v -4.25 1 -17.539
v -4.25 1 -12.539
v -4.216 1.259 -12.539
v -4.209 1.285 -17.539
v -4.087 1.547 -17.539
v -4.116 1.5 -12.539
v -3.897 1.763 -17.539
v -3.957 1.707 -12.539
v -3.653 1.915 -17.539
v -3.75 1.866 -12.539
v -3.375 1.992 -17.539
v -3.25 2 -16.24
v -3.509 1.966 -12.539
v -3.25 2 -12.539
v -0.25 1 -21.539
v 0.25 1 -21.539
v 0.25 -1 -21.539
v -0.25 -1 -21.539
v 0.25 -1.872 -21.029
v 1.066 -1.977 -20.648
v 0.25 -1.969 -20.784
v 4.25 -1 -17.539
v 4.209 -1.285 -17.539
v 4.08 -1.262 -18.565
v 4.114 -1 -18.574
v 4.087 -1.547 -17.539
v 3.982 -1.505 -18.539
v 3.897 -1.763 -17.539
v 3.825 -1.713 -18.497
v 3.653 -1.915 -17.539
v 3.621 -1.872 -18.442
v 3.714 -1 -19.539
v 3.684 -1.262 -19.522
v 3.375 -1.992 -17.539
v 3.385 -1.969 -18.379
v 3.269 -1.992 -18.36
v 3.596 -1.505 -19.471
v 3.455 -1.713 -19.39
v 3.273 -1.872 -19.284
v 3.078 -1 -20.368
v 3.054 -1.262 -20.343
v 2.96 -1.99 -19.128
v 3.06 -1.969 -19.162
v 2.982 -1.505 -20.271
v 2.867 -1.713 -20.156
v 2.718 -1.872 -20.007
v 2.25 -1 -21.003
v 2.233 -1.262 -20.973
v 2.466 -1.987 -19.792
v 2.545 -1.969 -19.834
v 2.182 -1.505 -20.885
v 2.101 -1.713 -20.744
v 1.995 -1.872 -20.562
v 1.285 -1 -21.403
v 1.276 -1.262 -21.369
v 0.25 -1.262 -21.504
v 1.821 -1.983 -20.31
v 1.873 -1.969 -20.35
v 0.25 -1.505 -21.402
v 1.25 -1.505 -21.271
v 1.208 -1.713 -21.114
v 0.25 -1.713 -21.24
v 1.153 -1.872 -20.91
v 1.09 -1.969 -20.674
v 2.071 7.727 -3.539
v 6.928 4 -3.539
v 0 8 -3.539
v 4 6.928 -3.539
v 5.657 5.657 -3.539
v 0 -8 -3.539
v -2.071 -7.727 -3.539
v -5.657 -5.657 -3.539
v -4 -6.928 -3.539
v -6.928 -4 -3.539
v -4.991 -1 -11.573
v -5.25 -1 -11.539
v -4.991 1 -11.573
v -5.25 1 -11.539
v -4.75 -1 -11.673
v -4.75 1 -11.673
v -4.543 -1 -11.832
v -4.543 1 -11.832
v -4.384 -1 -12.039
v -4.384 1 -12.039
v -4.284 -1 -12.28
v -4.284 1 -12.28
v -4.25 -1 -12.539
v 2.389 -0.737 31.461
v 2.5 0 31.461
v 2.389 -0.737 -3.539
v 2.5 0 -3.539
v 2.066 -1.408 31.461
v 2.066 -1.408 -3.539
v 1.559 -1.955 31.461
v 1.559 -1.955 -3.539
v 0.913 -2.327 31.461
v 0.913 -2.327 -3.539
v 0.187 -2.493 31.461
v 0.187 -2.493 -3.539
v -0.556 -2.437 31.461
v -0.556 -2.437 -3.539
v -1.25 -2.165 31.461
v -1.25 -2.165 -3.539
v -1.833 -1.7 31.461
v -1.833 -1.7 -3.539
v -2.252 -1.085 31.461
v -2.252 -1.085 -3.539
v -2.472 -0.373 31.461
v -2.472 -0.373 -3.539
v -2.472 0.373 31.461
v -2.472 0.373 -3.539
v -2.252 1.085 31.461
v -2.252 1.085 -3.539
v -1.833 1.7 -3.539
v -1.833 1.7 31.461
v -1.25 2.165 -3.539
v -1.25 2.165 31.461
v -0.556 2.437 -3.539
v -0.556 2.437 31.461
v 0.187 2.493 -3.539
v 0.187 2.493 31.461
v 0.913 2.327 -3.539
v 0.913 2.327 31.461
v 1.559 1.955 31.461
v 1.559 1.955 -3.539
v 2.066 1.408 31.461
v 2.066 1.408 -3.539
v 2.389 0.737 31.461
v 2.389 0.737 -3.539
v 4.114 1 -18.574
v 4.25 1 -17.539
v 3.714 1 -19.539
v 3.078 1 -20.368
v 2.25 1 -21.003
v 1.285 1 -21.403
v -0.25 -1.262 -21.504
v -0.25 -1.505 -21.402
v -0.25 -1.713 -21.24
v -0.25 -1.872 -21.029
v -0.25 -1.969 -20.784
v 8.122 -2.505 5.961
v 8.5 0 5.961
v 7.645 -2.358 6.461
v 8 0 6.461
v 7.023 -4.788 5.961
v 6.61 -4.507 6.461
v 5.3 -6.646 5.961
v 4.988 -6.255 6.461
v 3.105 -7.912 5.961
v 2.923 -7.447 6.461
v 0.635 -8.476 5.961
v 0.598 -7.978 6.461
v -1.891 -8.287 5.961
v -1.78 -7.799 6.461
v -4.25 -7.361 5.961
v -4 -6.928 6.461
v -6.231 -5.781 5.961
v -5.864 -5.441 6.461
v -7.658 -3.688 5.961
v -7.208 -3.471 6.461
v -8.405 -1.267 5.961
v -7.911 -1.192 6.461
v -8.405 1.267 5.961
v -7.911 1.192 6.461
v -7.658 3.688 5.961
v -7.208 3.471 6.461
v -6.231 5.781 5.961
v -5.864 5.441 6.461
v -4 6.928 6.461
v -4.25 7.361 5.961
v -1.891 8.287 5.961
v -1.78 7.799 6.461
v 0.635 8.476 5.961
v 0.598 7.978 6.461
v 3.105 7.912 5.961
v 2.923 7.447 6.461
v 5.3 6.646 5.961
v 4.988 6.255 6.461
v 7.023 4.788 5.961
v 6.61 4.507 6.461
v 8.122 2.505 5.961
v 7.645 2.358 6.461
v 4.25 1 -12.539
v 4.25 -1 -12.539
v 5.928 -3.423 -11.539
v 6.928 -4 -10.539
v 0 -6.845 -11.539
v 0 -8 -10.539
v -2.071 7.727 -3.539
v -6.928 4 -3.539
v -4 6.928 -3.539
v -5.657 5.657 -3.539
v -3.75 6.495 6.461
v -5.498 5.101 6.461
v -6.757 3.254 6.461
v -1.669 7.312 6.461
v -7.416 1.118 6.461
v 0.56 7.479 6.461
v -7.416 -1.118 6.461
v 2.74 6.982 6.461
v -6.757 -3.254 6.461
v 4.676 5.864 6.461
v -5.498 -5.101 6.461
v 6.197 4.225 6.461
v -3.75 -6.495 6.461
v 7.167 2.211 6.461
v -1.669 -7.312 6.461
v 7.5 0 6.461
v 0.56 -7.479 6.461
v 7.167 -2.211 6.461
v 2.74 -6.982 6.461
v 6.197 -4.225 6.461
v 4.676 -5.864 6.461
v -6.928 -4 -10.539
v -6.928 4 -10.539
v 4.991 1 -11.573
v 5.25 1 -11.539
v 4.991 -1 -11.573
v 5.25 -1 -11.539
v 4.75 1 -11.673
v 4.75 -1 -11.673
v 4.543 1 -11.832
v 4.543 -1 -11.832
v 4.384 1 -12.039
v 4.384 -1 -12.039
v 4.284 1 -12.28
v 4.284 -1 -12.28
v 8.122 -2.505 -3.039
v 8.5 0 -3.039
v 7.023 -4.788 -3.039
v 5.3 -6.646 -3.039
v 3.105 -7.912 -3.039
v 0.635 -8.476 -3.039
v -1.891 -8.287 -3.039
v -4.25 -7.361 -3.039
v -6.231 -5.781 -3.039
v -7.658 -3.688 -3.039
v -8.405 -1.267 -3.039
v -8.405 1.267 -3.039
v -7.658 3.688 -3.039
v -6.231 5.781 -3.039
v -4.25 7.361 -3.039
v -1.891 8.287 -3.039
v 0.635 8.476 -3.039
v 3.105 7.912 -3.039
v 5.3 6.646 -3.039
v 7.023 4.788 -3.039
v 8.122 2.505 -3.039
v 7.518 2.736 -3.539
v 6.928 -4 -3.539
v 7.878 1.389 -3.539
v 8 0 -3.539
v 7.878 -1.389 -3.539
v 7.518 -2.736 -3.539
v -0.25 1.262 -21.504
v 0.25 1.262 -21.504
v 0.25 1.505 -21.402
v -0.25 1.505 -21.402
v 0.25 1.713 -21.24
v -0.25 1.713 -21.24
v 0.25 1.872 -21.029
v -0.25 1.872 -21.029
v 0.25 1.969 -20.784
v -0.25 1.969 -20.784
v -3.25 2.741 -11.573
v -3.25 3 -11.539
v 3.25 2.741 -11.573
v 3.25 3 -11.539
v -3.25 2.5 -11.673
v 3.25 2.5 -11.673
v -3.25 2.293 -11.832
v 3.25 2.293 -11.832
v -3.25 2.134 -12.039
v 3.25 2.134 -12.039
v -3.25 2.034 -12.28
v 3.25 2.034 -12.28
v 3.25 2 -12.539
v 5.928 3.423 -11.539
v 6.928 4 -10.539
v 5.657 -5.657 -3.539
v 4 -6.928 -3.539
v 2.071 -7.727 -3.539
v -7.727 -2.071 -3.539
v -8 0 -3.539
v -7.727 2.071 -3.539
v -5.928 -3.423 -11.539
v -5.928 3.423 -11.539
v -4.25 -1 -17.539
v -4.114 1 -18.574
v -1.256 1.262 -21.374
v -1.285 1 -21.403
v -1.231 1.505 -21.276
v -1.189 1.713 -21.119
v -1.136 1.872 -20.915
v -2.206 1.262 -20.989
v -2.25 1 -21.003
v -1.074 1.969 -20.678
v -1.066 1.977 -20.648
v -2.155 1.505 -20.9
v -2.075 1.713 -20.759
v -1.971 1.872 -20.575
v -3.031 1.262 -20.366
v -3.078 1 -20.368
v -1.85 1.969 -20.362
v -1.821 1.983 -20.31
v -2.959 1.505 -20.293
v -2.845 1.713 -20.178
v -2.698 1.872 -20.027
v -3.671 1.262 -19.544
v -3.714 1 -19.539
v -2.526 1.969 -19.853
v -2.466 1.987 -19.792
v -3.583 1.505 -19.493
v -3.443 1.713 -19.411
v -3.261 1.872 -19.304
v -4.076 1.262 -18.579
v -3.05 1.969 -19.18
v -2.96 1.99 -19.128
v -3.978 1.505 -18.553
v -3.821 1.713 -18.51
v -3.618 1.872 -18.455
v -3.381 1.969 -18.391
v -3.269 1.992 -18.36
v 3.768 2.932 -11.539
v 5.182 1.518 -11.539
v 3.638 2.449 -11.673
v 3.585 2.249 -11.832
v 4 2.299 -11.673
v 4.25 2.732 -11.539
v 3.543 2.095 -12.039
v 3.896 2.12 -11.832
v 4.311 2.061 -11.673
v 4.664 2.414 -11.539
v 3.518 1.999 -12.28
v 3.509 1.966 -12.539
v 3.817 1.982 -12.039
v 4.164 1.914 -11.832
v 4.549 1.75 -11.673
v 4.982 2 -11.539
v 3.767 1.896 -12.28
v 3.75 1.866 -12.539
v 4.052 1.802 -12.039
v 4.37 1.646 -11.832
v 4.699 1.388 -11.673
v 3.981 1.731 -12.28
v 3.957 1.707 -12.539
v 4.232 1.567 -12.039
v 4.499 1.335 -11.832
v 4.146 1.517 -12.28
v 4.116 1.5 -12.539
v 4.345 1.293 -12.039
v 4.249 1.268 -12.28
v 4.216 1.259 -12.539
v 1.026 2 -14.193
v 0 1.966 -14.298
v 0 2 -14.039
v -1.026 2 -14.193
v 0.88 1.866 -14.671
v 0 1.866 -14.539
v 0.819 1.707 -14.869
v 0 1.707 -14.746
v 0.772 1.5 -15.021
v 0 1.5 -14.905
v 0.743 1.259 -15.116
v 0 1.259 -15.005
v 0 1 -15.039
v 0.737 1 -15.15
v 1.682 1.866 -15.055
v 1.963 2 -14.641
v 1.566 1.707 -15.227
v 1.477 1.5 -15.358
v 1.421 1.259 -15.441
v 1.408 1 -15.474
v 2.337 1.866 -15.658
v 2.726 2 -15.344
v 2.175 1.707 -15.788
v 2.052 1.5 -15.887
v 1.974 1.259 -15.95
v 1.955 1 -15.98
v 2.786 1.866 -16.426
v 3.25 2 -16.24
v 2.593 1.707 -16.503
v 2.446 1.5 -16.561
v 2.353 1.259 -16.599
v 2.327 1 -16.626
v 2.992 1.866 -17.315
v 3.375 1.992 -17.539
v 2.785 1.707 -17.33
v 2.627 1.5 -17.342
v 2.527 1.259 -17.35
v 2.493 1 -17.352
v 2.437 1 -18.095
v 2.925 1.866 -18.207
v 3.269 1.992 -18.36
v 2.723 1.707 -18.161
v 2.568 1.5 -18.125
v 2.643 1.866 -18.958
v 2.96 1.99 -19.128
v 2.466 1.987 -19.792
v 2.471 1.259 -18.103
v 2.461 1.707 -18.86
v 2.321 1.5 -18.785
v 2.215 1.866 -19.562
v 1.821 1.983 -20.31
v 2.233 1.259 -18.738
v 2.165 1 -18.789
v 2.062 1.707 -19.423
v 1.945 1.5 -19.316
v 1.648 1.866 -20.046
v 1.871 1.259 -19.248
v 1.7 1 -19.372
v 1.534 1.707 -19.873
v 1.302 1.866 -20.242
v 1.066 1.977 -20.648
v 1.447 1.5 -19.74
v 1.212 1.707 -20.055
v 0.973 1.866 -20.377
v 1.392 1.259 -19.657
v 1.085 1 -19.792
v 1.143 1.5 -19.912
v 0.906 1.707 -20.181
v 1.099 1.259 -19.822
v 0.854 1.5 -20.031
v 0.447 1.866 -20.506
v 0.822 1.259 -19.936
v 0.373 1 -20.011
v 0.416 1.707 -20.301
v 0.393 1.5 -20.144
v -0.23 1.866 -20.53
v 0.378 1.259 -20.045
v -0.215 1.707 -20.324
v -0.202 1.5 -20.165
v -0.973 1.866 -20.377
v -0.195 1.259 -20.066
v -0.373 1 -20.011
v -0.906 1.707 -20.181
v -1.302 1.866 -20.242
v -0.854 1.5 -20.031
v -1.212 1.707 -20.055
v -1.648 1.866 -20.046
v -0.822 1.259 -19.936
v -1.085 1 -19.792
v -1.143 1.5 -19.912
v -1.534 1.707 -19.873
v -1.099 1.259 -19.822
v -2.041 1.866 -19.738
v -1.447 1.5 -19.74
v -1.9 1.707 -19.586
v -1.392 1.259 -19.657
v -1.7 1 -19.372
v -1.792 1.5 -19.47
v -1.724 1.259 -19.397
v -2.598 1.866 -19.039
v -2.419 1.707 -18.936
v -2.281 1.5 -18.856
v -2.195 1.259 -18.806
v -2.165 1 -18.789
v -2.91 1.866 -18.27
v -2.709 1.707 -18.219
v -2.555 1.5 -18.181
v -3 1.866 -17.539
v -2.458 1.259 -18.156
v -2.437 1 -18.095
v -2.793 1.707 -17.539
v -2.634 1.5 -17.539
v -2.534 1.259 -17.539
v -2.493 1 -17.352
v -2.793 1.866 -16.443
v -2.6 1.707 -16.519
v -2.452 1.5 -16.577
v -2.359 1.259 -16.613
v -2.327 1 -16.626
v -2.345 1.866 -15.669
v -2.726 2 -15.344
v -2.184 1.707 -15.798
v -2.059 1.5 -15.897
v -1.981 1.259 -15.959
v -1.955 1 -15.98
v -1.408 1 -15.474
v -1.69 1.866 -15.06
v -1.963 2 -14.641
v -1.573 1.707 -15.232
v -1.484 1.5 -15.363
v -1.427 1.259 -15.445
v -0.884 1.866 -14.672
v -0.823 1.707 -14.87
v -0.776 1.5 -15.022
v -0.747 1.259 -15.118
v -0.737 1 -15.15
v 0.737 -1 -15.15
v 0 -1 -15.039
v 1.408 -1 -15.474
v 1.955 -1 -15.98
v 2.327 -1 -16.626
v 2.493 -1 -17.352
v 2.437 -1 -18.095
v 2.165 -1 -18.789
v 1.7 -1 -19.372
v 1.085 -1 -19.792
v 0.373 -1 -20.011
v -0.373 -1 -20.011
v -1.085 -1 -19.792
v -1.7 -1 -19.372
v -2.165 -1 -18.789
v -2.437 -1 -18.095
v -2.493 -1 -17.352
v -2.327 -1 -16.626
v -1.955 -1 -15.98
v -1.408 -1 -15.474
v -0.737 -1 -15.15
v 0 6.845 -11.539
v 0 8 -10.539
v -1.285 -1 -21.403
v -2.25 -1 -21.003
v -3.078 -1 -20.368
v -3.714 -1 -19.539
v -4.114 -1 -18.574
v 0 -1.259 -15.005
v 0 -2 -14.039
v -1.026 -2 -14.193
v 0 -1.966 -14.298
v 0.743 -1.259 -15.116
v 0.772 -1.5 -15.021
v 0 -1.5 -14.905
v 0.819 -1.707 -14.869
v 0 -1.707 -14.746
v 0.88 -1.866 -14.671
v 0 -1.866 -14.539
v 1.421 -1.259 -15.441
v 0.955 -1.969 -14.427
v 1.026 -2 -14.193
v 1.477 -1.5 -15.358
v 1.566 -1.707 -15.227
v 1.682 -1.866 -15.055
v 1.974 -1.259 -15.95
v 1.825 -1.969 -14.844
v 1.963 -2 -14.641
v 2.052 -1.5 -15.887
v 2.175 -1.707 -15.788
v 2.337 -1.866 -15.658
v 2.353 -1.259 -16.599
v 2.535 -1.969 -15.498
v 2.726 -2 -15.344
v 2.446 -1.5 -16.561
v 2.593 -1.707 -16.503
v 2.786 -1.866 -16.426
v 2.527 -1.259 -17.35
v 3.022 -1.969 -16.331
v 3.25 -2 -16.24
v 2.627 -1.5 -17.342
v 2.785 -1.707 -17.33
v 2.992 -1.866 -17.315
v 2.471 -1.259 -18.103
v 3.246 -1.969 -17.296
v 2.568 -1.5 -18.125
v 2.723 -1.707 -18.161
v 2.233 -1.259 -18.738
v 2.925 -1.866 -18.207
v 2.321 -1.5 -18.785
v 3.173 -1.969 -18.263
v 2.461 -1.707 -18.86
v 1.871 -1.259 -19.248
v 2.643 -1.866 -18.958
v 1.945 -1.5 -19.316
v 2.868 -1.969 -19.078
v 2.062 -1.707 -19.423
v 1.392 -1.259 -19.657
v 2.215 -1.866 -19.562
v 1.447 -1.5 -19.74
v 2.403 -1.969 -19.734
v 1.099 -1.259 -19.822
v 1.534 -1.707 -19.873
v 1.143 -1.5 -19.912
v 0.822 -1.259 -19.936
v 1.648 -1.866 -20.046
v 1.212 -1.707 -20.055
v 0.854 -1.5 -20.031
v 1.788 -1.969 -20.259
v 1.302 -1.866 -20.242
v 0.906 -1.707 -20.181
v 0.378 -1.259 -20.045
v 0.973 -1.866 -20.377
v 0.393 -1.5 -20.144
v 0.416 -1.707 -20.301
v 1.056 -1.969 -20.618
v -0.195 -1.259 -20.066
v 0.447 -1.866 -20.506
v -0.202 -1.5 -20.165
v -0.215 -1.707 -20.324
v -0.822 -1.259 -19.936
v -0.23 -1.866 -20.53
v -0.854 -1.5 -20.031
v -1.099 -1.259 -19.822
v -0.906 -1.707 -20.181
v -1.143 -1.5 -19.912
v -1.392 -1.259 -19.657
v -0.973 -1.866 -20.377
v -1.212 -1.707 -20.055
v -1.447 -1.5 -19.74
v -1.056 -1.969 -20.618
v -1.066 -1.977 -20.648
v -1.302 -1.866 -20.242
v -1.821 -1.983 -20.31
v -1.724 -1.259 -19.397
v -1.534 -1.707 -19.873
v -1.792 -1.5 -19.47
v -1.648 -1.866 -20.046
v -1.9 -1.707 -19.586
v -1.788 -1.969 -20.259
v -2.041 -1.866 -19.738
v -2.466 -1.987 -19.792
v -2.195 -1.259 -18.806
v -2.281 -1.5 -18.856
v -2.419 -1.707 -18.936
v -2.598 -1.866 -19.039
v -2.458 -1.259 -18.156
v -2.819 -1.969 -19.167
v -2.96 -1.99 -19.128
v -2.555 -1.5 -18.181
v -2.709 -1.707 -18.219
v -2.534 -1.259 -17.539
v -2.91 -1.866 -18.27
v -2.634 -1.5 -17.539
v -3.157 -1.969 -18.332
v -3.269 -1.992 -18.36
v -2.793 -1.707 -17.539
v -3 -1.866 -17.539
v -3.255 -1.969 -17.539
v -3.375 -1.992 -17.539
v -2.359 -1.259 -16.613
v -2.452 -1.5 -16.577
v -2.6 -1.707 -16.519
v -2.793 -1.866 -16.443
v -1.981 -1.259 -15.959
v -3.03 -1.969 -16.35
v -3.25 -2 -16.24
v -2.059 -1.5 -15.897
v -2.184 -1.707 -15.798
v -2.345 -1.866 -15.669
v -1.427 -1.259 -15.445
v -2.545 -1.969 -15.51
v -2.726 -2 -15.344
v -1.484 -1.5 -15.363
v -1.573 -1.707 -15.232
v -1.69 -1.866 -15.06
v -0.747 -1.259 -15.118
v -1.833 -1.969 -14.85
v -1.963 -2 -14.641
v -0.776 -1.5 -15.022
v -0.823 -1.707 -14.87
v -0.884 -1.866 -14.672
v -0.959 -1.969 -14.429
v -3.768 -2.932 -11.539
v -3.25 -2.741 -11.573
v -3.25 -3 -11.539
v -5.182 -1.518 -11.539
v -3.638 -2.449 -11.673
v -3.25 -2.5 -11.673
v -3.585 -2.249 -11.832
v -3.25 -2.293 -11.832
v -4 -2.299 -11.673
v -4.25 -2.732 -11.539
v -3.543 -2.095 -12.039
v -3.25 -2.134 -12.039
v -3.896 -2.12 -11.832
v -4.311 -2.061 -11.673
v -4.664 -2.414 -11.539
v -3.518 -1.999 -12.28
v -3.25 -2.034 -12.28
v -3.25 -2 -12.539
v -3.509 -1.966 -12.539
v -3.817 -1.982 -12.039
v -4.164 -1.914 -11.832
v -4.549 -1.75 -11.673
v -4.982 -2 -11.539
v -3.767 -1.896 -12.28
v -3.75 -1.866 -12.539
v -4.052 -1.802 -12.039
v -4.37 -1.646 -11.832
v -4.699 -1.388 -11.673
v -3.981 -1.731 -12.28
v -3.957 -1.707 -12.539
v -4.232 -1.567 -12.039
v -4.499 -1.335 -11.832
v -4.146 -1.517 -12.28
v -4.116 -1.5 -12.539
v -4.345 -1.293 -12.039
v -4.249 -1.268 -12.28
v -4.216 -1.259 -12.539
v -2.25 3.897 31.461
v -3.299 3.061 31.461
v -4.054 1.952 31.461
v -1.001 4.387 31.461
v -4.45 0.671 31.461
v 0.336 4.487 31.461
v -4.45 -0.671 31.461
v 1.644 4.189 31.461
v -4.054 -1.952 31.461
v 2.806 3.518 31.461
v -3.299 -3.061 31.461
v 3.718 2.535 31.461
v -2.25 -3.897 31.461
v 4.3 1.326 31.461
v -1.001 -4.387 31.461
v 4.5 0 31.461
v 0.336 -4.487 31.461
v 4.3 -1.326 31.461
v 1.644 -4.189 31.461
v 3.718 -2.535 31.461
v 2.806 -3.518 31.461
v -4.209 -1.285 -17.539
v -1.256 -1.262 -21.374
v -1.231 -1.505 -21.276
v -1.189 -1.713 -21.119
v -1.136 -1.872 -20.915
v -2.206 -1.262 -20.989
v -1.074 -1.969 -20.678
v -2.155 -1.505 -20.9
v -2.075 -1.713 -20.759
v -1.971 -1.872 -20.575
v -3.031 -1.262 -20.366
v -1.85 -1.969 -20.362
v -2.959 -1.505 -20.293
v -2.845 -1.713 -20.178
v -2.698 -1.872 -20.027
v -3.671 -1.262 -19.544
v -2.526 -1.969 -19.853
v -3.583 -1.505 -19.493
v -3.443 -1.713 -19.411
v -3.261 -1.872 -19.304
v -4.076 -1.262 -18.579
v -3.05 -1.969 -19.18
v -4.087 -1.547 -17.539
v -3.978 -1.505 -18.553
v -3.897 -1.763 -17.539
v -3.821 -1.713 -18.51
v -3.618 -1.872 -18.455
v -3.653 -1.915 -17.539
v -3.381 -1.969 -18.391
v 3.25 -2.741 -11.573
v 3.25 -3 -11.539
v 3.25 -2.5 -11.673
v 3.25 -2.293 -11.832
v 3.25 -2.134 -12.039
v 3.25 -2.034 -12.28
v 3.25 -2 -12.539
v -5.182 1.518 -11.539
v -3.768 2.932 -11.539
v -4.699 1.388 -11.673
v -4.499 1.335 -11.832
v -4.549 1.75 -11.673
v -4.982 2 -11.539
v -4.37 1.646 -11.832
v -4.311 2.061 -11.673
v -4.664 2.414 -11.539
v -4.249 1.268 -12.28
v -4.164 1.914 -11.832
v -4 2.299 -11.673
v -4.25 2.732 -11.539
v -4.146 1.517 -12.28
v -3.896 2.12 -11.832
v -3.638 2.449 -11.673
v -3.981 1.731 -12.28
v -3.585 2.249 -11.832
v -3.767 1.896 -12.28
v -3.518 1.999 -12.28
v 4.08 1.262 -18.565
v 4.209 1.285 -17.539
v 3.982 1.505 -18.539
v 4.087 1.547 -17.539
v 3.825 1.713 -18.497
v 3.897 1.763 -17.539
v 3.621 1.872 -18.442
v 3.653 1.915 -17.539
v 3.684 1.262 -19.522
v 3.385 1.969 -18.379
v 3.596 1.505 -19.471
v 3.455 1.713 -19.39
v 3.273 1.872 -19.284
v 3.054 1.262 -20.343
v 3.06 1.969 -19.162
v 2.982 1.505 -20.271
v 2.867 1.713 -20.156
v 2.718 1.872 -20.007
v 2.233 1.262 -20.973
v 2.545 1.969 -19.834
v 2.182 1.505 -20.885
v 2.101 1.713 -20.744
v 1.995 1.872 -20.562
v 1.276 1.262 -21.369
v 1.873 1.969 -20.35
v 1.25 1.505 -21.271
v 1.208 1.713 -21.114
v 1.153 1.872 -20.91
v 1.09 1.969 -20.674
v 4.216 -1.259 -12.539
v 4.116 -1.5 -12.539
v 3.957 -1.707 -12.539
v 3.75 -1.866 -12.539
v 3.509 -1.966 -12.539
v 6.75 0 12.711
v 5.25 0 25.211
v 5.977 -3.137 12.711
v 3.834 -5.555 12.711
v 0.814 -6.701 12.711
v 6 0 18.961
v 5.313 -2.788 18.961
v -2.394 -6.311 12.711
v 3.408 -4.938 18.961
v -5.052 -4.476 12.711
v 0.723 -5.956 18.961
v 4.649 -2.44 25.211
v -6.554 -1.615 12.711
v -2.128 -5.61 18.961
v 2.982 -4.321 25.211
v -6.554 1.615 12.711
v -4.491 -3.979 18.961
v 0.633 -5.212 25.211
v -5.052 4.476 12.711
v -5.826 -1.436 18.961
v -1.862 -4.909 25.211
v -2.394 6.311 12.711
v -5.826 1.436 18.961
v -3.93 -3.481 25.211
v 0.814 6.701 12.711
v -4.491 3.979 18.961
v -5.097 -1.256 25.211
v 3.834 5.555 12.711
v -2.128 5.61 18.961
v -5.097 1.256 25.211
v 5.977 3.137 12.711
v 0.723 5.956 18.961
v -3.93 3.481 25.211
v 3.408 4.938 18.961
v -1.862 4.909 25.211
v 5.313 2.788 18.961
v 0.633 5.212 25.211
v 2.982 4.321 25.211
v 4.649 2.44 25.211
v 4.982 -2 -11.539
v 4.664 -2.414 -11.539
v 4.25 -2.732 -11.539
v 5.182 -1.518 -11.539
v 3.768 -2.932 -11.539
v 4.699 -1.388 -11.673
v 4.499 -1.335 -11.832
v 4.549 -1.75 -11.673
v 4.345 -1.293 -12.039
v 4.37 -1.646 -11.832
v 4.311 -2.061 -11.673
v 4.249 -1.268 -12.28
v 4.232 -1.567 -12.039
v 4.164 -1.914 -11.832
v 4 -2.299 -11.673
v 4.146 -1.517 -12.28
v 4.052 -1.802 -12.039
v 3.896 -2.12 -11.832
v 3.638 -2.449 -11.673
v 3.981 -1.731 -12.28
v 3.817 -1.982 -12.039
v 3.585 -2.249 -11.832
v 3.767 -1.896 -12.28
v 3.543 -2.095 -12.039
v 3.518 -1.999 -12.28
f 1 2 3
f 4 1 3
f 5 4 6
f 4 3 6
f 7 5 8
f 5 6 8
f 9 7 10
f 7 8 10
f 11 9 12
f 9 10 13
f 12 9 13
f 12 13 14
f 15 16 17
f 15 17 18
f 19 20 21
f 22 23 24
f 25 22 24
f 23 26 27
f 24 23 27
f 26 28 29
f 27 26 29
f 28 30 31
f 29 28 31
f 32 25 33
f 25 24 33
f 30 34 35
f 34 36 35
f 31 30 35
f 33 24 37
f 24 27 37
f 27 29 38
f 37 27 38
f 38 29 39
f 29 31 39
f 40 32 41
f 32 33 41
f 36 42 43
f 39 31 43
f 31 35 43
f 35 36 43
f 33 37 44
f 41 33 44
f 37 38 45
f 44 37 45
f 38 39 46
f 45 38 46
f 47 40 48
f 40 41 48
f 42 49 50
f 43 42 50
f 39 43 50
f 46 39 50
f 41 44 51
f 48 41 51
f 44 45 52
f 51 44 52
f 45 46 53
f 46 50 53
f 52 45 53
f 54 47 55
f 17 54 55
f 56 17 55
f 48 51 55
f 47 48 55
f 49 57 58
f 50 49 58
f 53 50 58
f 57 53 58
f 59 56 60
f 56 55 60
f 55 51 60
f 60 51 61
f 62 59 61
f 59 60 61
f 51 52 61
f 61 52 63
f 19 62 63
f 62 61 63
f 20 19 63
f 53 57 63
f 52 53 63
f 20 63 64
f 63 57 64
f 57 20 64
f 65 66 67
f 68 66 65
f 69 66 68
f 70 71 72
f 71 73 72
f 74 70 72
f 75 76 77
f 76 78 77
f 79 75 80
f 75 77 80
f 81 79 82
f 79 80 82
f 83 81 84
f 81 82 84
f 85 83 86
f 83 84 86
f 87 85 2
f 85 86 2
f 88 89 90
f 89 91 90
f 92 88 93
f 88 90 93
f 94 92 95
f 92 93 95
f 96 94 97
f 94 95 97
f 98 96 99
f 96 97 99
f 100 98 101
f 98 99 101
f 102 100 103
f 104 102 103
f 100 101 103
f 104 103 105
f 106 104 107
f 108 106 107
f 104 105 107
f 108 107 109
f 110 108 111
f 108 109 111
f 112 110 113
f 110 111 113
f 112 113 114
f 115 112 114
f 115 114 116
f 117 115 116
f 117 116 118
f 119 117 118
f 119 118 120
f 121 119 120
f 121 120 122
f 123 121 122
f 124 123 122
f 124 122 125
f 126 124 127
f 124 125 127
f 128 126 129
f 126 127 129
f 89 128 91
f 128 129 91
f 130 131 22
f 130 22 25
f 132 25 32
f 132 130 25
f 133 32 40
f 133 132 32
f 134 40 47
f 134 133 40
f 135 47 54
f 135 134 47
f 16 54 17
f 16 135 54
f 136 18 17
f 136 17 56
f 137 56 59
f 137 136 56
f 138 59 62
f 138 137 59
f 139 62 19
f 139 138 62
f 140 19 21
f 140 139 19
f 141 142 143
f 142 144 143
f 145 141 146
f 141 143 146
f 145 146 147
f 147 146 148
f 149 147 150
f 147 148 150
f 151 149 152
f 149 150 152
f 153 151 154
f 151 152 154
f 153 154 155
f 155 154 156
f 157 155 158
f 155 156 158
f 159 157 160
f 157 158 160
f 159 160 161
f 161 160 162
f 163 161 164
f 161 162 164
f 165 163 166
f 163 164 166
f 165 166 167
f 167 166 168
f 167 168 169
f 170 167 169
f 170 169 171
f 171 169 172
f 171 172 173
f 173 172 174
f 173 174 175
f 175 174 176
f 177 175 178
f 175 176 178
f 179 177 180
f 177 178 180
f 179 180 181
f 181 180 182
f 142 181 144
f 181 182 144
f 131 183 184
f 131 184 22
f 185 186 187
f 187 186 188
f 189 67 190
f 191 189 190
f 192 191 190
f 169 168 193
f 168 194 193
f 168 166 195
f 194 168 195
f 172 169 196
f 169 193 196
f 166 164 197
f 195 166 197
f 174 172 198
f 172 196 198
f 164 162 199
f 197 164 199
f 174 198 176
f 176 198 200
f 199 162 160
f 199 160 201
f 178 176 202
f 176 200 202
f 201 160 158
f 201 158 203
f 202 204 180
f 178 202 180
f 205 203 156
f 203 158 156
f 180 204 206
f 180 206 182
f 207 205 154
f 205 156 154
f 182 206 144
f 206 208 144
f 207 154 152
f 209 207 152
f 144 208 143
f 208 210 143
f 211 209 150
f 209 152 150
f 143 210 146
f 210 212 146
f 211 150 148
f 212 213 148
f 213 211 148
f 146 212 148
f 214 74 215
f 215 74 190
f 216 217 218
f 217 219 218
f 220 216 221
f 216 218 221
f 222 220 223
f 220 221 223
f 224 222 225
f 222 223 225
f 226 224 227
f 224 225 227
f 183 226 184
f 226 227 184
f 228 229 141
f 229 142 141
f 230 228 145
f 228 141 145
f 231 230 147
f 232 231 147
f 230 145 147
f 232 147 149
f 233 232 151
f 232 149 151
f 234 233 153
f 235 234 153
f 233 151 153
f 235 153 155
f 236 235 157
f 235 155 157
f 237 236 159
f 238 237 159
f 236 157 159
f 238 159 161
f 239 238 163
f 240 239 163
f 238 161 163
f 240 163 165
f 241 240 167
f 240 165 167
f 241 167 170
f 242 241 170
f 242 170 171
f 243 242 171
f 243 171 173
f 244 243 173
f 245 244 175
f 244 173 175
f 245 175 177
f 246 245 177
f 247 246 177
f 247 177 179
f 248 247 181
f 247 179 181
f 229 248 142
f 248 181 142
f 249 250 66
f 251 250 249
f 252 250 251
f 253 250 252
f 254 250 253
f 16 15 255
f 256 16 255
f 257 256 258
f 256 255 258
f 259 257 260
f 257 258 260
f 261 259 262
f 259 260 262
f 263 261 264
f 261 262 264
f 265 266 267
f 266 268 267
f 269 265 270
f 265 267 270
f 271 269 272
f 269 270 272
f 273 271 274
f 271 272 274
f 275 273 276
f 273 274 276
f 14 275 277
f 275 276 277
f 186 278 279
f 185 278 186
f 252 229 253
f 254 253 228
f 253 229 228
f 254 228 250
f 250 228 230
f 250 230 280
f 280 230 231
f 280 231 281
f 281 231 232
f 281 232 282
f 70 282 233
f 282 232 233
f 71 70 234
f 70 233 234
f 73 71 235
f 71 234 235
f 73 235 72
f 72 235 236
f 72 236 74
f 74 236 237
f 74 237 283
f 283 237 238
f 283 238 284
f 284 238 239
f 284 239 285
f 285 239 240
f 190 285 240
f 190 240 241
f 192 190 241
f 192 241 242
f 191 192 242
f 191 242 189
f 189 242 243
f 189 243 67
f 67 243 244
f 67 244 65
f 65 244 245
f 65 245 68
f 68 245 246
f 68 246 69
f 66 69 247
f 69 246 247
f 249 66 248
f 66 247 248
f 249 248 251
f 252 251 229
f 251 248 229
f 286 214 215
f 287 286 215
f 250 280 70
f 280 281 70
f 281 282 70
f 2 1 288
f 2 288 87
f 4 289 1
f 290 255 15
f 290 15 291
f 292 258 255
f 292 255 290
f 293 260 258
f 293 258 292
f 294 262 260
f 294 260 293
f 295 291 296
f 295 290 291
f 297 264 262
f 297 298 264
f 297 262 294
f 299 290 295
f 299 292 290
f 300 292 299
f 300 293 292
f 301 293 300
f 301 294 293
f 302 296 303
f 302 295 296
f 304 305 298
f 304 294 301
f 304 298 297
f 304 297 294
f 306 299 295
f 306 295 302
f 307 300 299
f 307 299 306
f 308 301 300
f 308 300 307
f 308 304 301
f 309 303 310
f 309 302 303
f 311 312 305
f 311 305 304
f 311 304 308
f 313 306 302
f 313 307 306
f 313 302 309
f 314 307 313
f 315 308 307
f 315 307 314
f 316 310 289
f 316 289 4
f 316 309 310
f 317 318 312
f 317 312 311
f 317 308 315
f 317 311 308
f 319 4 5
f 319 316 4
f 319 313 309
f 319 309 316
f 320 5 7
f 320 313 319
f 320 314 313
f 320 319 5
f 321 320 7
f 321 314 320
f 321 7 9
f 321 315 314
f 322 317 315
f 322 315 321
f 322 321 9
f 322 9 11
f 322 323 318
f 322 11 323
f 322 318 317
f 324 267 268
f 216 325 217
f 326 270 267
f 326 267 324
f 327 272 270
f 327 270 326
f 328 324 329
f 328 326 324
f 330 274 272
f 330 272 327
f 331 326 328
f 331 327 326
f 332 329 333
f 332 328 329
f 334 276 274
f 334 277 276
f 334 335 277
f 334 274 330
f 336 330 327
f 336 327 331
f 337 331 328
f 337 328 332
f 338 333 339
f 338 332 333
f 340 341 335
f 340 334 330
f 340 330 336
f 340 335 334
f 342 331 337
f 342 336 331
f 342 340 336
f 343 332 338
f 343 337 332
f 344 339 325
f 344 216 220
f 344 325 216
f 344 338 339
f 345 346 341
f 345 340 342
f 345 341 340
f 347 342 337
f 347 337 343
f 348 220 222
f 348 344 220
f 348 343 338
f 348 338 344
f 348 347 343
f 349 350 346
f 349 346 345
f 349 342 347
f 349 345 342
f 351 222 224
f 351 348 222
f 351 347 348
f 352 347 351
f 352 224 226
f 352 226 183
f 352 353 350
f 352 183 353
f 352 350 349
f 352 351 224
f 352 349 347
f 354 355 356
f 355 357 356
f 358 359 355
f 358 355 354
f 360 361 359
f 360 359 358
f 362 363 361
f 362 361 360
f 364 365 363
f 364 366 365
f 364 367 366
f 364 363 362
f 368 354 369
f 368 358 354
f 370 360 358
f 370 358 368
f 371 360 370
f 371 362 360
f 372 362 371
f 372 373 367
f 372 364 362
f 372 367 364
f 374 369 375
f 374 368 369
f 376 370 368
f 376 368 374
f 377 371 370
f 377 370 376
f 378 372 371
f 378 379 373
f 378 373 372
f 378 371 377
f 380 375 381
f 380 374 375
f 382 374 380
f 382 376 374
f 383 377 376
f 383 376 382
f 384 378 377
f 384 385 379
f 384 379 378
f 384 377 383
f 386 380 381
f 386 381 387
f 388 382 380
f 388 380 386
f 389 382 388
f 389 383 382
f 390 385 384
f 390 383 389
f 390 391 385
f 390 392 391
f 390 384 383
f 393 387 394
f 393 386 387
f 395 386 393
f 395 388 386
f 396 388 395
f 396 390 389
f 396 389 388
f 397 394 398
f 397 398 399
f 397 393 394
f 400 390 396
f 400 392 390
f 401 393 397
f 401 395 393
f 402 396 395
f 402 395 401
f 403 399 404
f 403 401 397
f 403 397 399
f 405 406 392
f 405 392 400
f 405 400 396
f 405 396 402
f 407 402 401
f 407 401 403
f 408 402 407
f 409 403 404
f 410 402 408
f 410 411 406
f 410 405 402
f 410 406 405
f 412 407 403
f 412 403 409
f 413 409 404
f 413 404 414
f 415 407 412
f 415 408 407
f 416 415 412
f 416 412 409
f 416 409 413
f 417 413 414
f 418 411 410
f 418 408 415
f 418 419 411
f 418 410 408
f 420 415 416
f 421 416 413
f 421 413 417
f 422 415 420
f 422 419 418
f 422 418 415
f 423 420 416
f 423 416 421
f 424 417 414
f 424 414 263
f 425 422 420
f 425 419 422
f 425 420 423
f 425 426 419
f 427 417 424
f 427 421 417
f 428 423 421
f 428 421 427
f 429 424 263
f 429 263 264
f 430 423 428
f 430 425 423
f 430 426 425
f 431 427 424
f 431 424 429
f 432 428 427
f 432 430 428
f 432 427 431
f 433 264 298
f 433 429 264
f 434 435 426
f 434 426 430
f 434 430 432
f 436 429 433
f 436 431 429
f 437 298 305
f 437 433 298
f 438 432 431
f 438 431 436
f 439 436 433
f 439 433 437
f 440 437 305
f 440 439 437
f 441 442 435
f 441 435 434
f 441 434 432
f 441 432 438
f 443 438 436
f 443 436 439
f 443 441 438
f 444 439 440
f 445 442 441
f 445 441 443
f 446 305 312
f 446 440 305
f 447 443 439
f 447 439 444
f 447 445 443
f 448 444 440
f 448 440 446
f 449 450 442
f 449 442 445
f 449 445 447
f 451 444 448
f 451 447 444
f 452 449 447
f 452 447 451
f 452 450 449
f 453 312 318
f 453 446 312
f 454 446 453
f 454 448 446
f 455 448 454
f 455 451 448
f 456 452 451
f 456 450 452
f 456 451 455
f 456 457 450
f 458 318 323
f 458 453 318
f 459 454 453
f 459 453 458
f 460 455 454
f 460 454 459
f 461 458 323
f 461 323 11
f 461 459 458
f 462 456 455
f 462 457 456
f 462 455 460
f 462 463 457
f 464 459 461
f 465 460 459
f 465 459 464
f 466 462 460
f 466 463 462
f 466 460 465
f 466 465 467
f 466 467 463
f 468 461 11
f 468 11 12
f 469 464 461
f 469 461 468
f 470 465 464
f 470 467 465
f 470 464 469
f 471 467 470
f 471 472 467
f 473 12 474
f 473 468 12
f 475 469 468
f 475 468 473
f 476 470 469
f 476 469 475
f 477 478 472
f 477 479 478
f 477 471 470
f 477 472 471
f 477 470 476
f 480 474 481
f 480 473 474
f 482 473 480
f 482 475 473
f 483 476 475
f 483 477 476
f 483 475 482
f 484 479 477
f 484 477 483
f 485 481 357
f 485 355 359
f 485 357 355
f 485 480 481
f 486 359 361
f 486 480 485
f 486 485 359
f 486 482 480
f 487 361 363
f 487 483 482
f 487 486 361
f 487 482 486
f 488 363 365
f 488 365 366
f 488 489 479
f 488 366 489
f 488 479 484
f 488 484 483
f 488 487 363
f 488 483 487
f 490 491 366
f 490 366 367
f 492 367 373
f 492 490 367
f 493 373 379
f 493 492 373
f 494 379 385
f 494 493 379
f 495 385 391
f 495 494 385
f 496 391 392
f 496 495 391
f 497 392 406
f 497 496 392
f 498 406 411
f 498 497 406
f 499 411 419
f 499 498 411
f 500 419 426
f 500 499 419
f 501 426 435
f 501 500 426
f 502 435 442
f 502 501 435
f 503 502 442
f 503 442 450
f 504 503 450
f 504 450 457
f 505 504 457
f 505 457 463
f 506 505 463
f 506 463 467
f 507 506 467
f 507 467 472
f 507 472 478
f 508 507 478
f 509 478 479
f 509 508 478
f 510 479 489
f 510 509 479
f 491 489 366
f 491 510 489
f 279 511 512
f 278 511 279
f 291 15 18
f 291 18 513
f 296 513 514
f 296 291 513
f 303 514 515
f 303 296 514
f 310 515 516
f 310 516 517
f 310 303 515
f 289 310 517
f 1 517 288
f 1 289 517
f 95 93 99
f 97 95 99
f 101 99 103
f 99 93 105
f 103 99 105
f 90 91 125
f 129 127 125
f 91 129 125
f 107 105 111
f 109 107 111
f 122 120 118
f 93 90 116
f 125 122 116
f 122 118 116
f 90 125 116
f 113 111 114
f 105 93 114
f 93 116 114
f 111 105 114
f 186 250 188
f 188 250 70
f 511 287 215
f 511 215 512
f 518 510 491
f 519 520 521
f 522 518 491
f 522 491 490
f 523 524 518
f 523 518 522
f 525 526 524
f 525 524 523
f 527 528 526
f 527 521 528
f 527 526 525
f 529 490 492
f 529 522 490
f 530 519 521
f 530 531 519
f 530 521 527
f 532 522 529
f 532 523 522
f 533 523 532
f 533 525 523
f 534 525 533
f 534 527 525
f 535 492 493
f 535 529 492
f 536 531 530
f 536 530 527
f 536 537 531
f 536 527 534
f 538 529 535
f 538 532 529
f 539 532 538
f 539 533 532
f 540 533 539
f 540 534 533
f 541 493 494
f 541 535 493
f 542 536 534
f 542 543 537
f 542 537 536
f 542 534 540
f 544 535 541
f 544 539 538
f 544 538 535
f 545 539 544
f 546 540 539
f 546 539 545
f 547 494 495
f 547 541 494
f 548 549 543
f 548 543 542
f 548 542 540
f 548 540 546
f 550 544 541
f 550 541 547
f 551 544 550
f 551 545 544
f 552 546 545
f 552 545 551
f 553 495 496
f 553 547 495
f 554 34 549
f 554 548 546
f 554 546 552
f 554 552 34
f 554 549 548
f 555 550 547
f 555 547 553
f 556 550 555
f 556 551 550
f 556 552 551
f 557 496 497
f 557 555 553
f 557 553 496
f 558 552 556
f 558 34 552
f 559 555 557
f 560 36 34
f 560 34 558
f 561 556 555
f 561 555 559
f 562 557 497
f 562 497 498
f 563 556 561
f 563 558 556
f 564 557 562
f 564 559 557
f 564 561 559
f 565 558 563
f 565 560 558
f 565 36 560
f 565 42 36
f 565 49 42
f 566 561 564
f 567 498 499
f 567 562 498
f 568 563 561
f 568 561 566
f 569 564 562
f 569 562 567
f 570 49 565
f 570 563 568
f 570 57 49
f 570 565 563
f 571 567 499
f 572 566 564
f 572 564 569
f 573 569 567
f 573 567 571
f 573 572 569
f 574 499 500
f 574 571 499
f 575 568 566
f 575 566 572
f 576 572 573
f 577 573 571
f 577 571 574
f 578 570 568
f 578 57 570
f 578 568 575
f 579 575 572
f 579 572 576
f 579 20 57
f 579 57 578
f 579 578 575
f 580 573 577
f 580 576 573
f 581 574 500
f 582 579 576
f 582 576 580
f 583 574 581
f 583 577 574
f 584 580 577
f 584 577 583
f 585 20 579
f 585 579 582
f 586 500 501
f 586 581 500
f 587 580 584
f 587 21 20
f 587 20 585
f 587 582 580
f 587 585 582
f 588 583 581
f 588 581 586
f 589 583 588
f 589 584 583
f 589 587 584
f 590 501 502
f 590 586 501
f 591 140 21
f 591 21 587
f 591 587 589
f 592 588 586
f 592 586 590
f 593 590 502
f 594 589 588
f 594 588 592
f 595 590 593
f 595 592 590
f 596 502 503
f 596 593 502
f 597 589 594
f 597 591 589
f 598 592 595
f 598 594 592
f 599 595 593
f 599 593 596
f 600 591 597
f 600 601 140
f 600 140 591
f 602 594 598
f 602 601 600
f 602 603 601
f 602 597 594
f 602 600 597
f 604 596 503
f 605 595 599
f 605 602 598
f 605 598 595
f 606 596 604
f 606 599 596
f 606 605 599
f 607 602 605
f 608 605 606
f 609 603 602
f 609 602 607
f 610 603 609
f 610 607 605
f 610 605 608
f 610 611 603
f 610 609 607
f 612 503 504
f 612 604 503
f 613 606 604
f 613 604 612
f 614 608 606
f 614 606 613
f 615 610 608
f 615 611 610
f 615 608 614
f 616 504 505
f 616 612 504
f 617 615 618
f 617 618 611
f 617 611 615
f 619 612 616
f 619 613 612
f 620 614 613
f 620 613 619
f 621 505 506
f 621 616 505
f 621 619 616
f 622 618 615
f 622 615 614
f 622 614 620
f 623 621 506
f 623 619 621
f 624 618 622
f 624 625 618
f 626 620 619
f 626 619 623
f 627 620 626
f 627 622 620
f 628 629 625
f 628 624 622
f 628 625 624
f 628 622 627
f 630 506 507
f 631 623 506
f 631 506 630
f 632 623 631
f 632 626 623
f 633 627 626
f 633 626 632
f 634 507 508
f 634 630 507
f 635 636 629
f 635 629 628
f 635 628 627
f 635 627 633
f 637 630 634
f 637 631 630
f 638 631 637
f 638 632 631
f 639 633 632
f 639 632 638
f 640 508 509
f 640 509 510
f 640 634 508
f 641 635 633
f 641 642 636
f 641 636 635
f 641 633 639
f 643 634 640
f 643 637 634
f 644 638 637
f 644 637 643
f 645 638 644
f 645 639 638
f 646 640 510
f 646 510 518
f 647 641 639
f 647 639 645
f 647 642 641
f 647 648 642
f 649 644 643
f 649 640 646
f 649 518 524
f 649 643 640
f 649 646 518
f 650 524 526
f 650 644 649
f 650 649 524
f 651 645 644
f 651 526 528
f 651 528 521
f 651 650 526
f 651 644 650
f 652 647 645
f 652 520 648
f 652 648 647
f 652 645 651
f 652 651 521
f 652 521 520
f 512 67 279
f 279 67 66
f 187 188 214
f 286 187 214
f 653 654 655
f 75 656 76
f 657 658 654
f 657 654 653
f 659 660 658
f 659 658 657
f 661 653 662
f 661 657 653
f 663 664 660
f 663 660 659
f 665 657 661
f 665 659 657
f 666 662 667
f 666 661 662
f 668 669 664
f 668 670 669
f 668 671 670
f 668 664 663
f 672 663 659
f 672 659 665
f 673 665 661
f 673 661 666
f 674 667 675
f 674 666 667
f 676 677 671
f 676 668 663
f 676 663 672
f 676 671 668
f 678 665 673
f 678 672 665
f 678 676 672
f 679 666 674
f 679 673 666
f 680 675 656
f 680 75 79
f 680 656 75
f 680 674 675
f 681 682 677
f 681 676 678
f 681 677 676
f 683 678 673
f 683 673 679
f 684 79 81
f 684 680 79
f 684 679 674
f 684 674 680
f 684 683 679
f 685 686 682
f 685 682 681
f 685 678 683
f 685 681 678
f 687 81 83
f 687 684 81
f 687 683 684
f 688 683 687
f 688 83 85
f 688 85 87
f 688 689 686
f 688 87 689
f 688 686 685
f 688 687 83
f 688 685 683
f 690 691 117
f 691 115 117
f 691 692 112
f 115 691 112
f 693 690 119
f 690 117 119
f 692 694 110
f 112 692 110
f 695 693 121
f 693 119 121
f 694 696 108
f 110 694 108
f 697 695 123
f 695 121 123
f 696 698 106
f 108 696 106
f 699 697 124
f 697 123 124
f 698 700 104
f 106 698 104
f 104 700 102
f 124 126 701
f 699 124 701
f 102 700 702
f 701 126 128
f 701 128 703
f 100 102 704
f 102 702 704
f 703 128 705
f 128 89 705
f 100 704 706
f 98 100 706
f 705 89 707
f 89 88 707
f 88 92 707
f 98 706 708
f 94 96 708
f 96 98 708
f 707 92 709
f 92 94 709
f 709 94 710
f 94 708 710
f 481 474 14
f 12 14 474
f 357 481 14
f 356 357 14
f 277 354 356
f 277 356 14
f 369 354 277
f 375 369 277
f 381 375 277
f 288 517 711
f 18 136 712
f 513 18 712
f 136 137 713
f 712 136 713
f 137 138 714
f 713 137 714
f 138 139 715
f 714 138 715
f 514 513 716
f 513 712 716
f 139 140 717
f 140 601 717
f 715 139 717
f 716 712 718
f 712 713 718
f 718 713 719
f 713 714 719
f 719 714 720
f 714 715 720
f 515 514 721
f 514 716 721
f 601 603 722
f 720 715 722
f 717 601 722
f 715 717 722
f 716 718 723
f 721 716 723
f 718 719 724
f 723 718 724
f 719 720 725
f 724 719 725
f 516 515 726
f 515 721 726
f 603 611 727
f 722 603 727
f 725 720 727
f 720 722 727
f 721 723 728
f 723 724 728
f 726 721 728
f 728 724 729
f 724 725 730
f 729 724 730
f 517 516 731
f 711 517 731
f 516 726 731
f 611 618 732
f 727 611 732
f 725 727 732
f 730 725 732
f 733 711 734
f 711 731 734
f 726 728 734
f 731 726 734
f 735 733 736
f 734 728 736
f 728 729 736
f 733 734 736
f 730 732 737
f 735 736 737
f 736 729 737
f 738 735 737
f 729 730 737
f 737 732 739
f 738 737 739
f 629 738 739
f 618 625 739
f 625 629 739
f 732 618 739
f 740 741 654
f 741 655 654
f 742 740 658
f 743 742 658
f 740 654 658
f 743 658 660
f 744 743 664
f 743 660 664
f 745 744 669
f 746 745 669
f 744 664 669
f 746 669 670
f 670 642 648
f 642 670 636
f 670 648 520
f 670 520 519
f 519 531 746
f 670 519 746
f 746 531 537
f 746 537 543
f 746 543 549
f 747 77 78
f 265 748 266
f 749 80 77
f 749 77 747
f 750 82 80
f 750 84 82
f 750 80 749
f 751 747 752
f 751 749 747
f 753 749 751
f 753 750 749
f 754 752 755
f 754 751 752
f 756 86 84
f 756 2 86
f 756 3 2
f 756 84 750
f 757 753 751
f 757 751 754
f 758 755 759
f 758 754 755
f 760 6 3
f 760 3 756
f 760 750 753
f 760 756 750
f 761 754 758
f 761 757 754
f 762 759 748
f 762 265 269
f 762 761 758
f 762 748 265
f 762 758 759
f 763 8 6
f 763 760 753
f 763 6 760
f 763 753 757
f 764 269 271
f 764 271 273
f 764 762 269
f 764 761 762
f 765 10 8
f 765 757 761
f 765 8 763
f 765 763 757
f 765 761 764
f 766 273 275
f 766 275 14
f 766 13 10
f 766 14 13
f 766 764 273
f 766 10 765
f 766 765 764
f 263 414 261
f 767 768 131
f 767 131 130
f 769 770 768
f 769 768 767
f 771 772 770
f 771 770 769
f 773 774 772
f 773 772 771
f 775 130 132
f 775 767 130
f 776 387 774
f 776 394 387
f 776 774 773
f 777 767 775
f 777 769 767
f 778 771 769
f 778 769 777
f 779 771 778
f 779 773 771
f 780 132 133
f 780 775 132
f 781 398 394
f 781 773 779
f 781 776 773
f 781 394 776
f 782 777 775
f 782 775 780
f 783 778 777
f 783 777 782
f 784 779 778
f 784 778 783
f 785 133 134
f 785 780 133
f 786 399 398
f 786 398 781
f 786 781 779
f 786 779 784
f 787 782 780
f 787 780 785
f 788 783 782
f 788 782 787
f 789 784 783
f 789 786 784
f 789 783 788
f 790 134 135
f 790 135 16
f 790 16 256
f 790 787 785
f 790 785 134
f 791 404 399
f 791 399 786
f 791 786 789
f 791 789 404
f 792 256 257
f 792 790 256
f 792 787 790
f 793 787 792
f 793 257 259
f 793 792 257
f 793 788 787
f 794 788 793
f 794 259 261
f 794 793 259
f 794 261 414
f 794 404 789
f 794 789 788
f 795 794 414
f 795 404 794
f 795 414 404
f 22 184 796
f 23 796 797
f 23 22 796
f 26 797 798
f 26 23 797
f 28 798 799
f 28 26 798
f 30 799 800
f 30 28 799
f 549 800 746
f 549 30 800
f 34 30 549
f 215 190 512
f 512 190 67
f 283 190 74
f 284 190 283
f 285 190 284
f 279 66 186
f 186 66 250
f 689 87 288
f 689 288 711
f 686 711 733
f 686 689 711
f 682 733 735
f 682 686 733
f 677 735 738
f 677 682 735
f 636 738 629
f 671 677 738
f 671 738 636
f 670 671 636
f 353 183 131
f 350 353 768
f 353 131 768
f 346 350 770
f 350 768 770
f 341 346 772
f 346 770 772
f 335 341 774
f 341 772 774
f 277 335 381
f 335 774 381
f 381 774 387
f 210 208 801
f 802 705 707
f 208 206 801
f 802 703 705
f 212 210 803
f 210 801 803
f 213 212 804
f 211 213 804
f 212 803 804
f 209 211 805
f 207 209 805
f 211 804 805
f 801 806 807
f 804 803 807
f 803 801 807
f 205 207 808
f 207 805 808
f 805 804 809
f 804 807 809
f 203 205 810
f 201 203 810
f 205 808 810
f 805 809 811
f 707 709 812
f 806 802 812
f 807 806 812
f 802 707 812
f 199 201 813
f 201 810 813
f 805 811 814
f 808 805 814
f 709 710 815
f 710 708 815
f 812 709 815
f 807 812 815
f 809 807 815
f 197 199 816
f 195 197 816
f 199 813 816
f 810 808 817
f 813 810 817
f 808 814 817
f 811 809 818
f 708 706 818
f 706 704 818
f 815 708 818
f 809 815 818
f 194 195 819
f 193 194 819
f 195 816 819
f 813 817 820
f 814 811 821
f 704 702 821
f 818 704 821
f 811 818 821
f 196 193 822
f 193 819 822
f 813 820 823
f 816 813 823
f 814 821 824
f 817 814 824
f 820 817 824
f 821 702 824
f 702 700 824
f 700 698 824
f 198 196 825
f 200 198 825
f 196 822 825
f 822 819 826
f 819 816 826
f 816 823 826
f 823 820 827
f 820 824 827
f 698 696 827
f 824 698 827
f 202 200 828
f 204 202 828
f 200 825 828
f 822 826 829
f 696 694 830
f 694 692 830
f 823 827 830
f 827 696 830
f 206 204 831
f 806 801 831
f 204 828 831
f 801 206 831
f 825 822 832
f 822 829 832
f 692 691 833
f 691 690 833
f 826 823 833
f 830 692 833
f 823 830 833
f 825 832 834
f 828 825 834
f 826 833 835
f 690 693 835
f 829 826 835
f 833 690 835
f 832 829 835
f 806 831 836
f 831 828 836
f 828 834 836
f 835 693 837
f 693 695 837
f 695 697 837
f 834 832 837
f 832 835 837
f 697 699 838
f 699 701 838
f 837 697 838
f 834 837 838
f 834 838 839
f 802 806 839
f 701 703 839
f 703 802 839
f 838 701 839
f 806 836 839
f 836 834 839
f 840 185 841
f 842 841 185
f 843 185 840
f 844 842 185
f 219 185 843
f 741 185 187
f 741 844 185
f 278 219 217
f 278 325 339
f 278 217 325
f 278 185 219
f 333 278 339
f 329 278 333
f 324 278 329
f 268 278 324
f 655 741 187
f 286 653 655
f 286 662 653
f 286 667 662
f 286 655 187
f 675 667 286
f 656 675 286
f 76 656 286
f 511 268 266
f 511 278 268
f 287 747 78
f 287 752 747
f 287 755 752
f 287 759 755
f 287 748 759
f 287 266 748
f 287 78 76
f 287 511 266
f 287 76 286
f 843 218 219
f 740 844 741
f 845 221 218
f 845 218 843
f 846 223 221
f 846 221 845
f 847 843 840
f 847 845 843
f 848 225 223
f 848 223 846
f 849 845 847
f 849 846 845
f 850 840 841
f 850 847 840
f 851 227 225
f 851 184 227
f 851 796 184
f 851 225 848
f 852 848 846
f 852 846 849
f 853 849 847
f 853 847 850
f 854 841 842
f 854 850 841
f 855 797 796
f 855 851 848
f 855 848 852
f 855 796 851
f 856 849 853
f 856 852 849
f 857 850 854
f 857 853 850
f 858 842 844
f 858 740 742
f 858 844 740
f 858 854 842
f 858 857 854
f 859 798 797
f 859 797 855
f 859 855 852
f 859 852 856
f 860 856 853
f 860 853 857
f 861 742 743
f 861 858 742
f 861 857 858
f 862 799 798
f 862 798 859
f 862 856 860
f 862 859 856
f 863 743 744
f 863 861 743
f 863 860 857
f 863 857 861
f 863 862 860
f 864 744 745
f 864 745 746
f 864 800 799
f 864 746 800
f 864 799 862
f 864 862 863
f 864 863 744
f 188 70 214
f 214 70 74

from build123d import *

# Parameters (mm, degrees)
EXTRUDE_2_DEPTH = 8
CHAMFER_1_SIZE  = 1
SKETCH_5_R      = 2.5
EXTRUDE_3_DEPTH = 2
FILLET_3_R      = 1


with BuildPart() as part:
    # 草图2 → 旋转1 (revolve)
    with BuildSketch(Plane(origin=(0, 0, 0), x_dir=(0, 0, -1), z_dir=(1, 0, 0)), mode=Mode.PRIVATE) as revolve_1_sk:
        Polygon((3.53910226, 2.5), (3.53910226, 8), (3.03910226, 8.5), (-5.96089774, 8.5), (-6.46089774, 8), (-6.46089774, 7.5), (-31.46089774, 4.5), (-31.46089774, 2.5), align=None)
    revolve(revolve_1_sk.sketch.rotate(Axis((0, 0, 0), (0, 0, -1)), 90), axis=Axis((0, 0, 0), (0, 0, -1)))

    # 草图4 → 凸台-拉伸2 (add)
    with BuildSketch(Plane(origin=(0, 0, -3.53910226), x_dir=(-1, 0, 0), z_dir=(0, 0, -1))):
        Polygon((0, 8), (-6.92820323, 4), (-6.92820323, -4), (0, -8), (6.92820323, -4), (6.92820323, 4), align=None)
    extrude(amount=EXTRUDE_2_DEPTH)

    # 倒角1
    chamfer_1_edges = [part.edges().sort_by_distance(p)[0] for p in [
        (-3.464101615, 6, -11.53910226),
        (3.464101615, 6, -11.53910226),
        (6.92820323, 0, -11.53910226),
        (3.464101615, -6, -11.53910226),
        (-3.464101615, -6, -11.53910226),
        (-6.92820323, 0, -11.53910226),
    ]]
    chamfer(chamfer_1_edges, length=CHAMFER_1_SIZE)

    # 草图5 → 凸台-拉伸3 (add, symmetric)
    with BuildSketch(Plane(origin=(0, 0, 0), x_dir=(1, 0, 0), z_dir=(0, 1, 0))):
        with BuildLine():
            Line((-4.25, 11.53910226), (4.25, 11.53910226))
            Line((4.25, 11.53910226), (4.25, 17.53910226))
            ThreePointArc((4.25, 17.53910226), (3.078427125, 20.367529385), (0.25, 21.53910226))
            Line((0.25, 21.53910226), (-0.25, 21.53910226))
            ThreePointArc((-0.25, 21.53910226), (-3.078427125, 20.367529385), (-4.25, 17.53910226))
            Line((-4.25, 17.53910226), (-4.25, 11.53910226))
        make_face()
        with Locations(Location((0, 17.53910226, 0), (0, 0, 270))):
            Circle(SKETCH_5_R, mode=Mode.SUBTRACT)
    extrude(amount=EXTRUDE_3_DEPTH, both=True)

    # 圆角3
    fillet_3_edges = [part.edges().sort_by_distance(p)[0] for p in [
        (-4.25, -2, -14.53910226),
        (4.25, -2, -14.53910226),
        (3.078427125, -2, -20.367529385),
        (0, -2, -21.53910226),
        (-3.078427125, -2, -20.367529385),
    ]]
    fillet(fillet_3_edges, radius=FILLET_3_R)
    fillet_3_2_edges = [part.edges().sort_by_distance(p)[0] for p in [
        (-4.25, 2, -14.53910226),
        (4.25, 2, -14.53910226),
        (3.078427125, 2, -20.367529385),
        (0, 2, -21.53910226),
        (-3.078427125, 2, -20.367529385),
    ]]
    fillet(fillet_3_2_edges, radius=FILLET_3_R)
    fillet_3_3_edges = [part.edges().sort_by_distance(p)[0] for p in [
        (0, 2, -11.53910226),
    ]]
    fillet(fillet_3_3_edges, radius=FILLET_3_R)
    # the kernel refuses this fillet: 1 mm, written as the material it takes off along each edge
    with BuildSketch(Plane(origin=(0, 2, -17.53910226), x_dir=(0, 0, 1), z_dir=(-1, 0, 0))) as fillet_3_4_piece_1:
        with BuildLine():
            CenterArc((2.5 + FILLET_3_R, -FILLET_3_R), FILLET_3_R, 90, 90)
            Line((2.5, -FILLET_3_R), (2.5 - FILLET_3_R * 0.02, -FILLET_3_R))
            Line((2.5 - FILLET_3_R * 0.02, -FILLET_3_R), (2.5 - FILLET_3_R * 0.02, FILLET_3_R * 0.02))
            Line((2.5 - FILLET_3_R * 0.02, FILLET_3_R * 0.02), (2.5 + FILLET_3_R, FILLET_3_R * 0.02))
            Line((2.5 + FILLET_3_R, FILLET_3_R * 0.02), (2.5 + FILLET_3_R, 0))
        make_face()
    revolve(axis=Axis((0, 2, -17.53910226), (0, 1, 0)), mode=Mode.SUBTRACT)
    # the kernel refuses this fillet: 1 mm, written as the material it takes off along each edge
    with BuildSketch(Plane(origin=(0, -2, -17.53910226), x_dir=(0, 0, 1), z_dir=(-1, 0, 0))) as fillet_3_5_piece_1:
        with BuildLine():
            CenterArc((2.5 + FILLET_3_R, FILLET_3_R), FILLET_3_R, 180, 90)
            Line((2.5, FILLET_3_R), (2.5 - FILLET_3_R * 0.02, FILLET_3_R))
            Line((2.5 - FILLET_3_R * 0.02, FILLET_3_R), (2.5 - FILLET_3_R * 0.02, -FILLET_3_R * 0.02))
            Line((2.5 - FILLET_3_R * 0.02, -FILLET_3_R * 0.02), (2.5 + FILLET_3_R, -FILLET_3_R * 0.02))
            Line((2.5 + FILLET_3_R, -FILLET_3_R * 0.02), (2.5 + FILLET_3_R, 0))
        make_face()
    revolve(axis=Axis((0, -2, -17.53910226), (0, 1, 0)), mode=Mode.SUBTRACT)


solid = part.part
